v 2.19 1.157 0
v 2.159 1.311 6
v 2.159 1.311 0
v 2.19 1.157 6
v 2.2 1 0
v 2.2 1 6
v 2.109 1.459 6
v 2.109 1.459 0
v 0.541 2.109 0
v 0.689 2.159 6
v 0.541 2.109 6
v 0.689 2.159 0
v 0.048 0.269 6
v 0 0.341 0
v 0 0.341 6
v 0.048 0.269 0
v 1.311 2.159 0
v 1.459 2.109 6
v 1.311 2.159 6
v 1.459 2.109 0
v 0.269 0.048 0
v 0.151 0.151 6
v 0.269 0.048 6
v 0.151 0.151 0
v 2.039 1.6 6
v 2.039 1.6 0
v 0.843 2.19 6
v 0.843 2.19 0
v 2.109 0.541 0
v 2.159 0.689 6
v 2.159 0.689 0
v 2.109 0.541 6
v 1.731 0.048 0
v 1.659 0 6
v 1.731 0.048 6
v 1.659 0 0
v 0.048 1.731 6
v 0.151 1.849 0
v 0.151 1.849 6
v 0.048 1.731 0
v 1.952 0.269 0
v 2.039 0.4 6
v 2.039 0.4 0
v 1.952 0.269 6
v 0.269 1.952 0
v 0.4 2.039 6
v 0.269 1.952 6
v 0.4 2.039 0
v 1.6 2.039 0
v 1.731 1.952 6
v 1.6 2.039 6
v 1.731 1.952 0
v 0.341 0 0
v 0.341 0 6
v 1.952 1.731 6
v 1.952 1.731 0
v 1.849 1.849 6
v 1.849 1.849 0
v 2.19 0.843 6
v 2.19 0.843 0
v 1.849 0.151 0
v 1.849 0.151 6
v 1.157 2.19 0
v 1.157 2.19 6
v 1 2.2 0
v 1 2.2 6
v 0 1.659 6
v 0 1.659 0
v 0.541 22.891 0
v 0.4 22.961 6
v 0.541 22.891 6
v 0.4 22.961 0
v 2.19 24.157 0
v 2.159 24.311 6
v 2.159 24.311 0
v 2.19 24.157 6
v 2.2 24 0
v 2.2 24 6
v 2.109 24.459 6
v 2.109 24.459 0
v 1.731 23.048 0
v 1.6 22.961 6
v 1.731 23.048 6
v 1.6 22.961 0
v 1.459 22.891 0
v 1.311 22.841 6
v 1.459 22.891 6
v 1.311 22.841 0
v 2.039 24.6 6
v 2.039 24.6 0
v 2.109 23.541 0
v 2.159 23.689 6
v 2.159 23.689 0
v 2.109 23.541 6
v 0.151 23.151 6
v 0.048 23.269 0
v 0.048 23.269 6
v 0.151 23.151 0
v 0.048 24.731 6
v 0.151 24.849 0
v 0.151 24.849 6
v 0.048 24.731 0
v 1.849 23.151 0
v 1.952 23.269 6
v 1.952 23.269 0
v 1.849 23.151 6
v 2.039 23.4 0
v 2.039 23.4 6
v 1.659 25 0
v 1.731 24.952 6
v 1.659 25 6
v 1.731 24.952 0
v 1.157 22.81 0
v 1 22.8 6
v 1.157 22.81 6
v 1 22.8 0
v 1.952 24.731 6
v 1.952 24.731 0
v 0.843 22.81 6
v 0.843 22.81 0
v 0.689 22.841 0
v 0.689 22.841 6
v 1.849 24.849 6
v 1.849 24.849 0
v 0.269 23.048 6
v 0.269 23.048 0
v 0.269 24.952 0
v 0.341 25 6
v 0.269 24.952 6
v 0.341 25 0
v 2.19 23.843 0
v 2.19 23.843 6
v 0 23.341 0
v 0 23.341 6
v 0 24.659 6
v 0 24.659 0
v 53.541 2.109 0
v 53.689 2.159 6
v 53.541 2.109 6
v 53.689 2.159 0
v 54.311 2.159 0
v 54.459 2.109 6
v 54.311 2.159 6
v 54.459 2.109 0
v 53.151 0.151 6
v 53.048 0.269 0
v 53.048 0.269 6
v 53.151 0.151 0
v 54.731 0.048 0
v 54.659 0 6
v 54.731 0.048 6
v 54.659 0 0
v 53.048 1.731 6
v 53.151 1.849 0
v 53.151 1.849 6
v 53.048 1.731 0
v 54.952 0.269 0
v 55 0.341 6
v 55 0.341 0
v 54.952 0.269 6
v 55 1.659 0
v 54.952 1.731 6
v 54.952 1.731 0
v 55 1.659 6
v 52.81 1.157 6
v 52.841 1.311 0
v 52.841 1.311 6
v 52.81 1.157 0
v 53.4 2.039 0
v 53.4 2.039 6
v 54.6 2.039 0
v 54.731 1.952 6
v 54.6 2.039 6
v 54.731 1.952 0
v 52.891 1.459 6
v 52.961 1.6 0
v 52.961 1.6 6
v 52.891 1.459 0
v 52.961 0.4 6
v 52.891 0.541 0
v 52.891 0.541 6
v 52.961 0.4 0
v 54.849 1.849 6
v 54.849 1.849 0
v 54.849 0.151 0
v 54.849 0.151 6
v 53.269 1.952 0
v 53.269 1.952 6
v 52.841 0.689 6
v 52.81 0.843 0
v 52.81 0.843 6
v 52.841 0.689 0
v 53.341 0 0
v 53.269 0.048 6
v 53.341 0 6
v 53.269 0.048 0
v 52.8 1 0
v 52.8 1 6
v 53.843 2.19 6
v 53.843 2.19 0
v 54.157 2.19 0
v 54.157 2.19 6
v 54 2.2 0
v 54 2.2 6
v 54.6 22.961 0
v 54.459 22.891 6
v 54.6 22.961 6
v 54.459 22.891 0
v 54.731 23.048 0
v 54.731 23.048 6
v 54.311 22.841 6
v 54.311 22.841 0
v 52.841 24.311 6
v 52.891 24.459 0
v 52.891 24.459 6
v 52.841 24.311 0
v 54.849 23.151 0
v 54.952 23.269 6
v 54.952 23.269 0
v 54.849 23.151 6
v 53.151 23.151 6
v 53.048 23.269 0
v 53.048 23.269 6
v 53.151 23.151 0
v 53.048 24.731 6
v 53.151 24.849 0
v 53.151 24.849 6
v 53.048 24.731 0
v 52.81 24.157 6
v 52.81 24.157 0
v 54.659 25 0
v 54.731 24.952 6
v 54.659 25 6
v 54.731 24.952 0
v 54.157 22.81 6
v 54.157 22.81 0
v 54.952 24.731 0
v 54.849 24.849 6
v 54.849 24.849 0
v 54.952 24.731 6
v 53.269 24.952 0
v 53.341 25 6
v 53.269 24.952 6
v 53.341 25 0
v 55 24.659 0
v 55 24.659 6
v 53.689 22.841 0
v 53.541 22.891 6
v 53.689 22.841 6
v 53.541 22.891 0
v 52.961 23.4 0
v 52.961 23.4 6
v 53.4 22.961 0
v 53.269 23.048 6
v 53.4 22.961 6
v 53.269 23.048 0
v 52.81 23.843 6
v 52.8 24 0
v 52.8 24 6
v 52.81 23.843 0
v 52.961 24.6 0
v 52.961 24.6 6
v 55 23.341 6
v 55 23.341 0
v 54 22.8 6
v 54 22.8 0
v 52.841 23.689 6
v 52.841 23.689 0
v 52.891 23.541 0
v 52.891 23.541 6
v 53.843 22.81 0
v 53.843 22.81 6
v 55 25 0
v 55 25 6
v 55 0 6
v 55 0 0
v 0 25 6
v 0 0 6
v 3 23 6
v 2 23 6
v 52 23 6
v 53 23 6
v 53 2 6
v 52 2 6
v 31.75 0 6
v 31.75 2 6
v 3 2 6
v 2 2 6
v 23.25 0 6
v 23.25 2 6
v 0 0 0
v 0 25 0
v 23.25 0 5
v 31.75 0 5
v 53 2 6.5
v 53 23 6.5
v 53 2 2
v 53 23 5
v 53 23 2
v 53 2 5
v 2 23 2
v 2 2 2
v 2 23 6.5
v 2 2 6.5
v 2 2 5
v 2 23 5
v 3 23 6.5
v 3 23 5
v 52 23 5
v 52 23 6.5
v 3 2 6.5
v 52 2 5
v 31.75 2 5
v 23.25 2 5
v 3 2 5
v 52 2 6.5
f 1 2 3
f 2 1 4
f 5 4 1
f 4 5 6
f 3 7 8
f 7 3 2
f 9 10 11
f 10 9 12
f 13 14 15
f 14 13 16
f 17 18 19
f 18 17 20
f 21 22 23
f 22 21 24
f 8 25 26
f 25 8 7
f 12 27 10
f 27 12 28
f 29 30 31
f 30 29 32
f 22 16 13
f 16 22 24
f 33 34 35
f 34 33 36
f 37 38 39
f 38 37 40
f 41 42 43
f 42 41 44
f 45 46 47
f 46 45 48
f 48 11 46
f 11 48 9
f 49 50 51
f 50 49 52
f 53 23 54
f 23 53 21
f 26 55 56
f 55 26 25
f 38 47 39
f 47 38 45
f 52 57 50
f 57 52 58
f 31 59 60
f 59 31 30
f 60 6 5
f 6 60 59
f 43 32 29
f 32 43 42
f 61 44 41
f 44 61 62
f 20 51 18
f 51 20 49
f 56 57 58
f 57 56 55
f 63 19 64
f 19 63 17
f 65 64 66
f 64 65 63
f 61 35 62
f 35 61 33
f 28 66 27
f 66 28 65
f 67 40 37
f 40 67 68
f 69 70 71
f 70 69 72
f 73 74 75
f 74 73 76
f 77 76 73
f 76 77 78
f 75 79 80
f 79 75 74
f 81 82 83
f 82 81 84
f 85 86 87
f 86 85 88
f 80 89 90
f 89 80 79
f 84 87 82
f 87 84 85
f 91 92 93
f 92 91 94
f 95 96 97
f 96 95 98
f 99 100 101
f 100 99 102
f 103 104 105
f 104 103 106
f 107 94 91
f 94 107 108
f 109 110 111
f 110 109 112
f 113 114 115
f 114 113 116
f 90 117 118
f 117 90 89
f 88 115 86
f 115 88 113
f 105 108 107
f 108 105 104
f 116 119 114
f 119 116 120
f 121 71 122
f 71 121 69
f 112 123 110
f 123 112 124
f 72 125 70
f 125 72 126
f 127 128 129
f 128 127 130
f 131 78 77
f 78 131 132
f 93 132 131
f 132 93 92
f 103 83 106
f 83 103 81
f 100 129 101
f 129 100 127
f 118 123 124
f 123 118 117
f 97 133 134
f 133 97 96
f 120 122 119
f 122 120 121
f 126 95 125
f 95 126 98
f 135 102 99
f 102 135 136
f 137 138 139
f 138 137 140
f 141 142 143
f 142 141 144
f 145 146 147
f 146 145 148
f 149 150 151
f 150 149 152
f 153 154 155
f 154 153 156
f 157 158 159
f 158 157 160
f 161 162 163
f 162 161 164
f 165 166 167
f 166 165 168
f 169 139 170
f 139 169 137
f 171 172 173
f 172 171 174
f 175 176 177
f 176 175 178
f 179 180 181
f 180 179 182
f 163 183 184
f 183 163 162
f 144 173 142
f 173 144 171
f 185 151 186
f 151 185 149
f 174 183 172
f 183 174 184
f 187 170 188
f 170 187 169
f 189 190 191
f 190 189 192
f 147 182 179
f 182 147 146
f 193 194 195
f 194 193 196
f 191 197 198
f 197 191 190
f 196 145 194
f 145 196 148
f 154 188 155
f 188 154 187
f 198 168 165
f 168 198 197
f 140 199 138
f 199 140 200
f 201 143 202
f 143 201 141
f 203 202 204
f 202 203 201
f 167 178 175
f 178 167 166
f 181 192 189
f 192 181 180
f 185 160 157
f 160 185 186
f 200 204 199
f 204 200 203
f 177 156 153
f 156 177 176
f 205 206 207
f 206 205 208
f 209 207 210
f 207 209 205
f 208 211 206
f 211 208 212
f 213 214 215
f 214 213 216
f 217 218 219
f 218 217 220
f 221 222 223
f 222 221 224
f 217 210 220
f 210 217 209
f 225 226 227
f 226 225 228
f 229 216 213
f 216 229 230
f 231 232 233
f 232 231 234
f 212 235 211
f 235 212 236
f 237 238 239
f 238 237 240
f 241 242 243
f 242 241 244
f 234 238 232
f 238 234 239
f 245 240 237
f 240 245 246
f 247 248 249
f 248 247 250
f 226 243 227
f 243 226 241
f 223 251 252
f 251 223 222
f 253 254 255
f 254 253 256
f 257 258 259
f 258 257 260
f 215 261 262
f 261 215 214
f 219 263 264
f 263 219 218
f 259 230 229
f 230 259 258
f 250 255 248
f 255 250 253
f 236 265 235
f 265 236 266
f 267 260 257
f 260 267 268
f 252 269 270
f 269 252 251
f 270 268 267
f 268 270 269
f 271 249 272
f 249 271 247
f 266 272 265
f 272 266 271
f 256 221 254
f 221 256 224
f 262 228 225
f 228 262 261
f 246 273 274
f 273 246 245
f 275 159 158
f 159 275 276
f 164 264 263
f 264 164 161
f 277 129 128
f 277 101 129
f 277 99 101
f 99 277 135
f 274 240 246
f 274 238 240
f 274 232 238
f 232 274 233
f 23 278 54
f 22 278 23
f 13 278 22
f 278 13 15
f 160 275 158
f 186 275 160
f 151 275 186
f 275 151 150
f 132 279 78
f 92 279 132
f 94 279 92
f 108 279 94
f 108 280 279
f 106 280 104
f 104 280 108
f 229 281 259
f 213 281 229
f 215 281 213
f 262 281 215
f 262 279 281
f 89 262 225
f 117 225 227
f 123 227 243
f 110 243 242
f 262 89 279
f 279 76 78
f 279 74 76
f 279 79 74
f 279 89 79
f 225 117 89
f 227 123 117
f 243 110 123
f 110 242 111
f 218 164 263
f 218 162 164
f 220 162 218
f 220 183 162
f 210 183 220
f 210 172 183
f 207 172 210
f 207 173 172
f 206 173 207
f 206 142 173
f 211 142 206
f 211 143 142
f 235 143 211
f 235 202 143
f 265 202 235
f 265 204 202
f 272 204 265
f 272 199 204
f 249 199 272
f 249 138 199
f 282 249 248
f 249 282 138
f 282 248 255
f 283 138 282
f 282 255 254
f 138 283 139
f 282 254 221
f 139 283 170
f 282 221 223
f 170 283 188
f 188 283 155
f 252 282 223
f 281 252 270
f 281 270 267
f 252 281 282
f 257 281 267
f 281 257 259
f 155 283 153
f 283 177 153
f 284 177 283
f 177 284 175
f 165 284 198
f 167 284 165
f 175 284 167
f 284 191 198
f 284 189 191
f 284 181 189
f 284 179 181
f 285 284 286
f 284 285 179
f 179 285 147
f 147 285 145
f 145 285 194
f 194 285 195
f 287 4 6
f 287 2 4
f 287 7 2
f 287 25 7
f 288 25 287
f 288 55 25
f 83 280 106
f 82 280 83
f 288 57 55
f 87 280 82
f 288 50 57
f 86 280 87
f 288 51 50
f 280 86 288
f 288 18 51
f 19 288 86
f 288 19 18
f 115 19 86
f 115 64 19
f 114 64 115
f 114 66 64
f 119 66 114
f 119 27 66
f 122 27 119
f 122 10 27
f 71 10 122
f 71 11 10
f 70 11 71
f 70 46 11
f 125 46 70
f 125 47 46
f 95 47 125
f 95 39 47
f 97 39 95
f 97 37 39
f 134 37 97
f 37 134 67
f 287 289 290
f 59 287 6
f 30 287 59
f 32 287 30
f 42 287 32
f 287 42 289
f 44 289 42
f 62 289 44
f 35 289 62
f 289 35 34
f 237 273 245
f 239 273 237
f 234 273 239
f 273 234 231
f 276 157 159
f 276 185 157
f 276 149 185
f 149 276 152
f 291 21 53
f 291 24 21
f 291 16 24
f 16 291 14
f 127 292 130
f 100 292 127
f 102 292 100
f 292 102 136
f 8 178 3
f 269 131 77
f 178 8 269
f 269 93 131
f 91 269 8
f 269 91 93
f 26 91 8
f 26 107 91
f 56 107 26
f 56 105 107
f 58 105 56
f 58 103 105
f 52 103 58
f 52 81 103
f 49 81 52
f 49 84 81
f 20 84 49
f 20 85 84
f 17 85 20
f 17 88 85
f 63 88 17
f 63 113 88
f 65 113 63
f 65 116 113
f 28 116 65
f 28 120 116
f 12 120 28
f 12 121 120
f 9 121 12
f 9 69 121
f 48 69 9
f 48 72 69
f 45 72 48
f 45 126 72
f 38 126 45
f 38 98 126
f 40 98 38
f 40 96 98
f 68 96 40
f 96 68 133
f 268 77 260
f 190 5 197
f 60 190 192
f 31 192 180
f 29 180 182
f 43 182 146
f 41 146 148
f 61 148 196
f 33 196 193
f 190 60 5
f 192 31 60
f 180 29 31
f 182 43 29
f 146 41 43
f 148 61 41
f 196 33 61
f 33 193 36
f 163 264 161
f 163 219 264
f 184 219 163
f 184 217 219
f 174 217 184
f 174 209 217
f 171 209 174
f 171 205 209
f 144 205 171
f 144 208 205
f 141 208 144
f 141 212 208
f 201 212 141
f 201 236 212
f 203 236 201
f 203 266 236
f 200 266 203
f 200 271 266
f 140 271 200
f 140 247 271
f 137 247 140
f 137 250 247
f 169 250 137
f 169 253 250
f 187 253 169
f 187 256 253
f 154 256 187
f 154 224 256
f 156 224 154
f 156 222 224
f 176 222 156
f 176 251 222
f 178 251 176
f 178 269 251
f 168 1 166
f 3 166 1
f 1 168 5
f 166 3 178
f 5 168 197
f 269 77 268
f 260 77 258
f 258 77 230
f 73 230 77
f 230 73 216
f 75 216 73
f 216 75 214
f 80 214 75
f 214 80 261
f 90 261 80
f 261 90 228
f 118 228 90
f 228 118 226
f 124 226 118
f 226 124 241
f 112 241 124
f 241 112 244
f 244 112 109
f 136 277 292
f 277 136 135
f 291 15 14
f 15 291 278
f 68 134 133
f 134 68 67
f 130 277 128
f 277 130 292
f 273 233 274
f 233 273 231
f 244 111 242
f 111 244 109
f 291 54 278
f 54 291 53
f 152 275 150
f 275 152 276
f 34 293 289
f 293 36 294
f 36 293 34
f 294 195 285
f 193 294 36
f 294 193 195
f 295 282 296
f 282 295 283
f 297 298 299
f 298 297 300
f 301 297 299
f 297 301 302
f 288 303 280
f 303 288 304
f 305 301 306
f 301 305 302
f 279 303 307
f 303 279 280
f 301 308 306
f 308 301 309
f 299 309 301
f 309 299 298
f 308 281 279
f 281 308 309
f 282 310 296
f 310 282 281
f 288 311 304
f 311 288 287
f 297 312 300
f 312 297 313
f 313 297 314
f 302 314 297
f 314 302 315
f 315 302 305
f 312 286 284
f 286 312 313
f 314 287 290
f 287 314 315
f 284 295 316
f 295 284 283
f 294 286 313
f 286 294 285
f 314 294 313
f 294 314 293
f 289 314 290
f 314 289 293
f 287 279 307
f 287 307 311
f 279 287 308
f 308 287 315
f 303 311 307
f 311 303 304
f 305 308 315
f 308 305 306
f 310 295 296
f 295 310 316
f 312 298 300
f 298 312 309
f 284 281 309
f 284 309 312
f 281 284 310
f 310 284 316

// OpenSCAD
// file: params.scad
/*
 * params.scad — every dimension the printed parts share, in millimetres.
 * ======================================================================
 * Included by all cad/*.scad files. No dimension may be duplicated in a part
 * file; if two parts need the same number, it lives here.
 *
 * Values marked MEASURE are design targets until caliper measurements of a real
 * X240 top section replace them (issue #44). Everything else is a design choice.
 */

// ---------------------------------------------------------------- deck / case
case_width  = 309.0;   // MEASURE  X, left to right, at the deck's mating surface
case_depth  = 210.0;   // MEASURE  Y, front (palmrest) to back
wall_t      = 2.5;     // PETG shell wall
corner_r    = 3.0;     // MEASURE  outer corner radius
internal_h  = 18.0;    // floor-to-deck clearance (see docs/enclosure/integration.md)
case_h      = internal_h + wall_t;

// Screw bosses that meet the X240 deck, from the front-left corner.  MEASURE all.
deck_boss_positions = [
    [  8.0,   8.0 ], [ 60.0,   8.0 ], [150.0,   8.0 ], [250.0,   8.0 ], [301.0,   8.0 ],
    [  8.0, 202.0 ], [150.0, 202.0 ], [301.0, 202.0 ],
];
boss_od = 6.0;
boss_id = 3.2;         // M2 heat-set insert hole (insert OD ~3.2 for a 3.5 mm body)

// ---------------------------------------------------------------- split joint
split      = true;     // print as two halves (fits a 220 mm bed); false = one piece
split_x    = case_width / 2;
tab_count  = 3;        // dovetail tabs along the floor seam
tab_w      = 14.0;     // tab width at the seam
tab_flare  = 3.0;      // extra width at the tip (dovetail angle)
tab_len    = 10.0;     // how far the tab reaches into the other half
joint_gap  = 0.15;     // clearance per face; tune with a 30 mm coupon
pin_d      = 3.0;      // alignment pins through the front/rear walls
pin_len    = 10.0;

// ---------------------------------------------------------------- board / sled
board_w    = 100.0;    // stripboard or Rev B PCB
board_d    = 80.0;
board_hole_inset = 4.0;                  // M2 holes this far from each board corner
board_hole_d     = 2.4;
sled_margin      = 6.0;                  // sled extends this far past the board
sled_t           = 2.0;
sled_standoff_h  = 6.0;                  // board sits this high above the sled
sled_standoff_od = 5.0;
// sled centre in the case (rear-centre; see docs/enclosure/integration.md)
sled_center = [ case_width / 2, case_depth - 8 - board_d / 2 - sled_margin - 6 ];
// sled-to-case bosses (around the sled, two per half so the sled bridges the seam)
sled_boss_offsets = [ [-56, -46], [56, -46], [-56, 46], [56, 46] ];

// ---------------------------------------------------------------- Pico
pico_w = 51.0;
pico_d = 21.0;
pico_h = 1.0;          // PCB thickness
pico_hole_d = 2.1;     // Pico mounting holes, 11.4 x 47 mm pattern
pico_hole_dx = 47.0;
pico_hole_dy = 11.4;

// ---------------------------------------------------------------- USB
usb_c     = false;                     // false = Micro-USB cutout, true = USB-C
usb_w     = usb_c ? 9.5 : 8.5;
usb_h     = usb_c ? 4.0 : 3.5;
usb_x     = sled_center[0];            // cutout centred on the board
usb_z     = wall_t + sled_t + sled_standoff_h + 1.6;   // bottom of the Pico's connector
cable_d   = 4.5;                       // USB cable jacket diameter
relief_w  = 22.0;                      // strain-relief bezel footprint
relief_d  = 12.0;
relief_h  = 10.0;

// ---------------------------------------------------------------- FPC
fpc_w        = 22.0;   // 40-pin 0.5 mm cable width
fpc_t        = 0.3;
fpc_min_r    = 5.0;    // minimum bend radius
clickpad_fpc_w = 8.0;  // MEASURE  ClickPad cable width
zif_body_w   = 26.0;   // 40-pin ZIF connector body length along the cable edge
zif_body_d   = 6.0;
zif_body_h   = 5.0;
zif_cp_body_w = 12.0;  // ClickPad ZIF body (pin count from probing)

// ---------------------------------------------------------------- gasket, vents, feet
gasket_depth = 1.2;
gasket_width = 2.0;
vents        = false;  // not thermally needed (docs/enclosure/durability.md)
vent_w = 40.0; vent_h = 2.0; vent_count = 4; vent_spacing = 6.0;
ribs         = true;   // two front-to-back stiffening ribs in the floor
rib_t        = 2.0;
rib_h        = 4.0;

foot_d       = 10.0;   // rubber feet, front
foot_recess  = 1.0;
foot_positions = [ [25, 20], [case_width - 25, 20] ];
tilt_positions = [ [25, case_depth - 20], [case_width - 25, case_depth - 20] ];
tilt_h       = 12.0;   // rear riser height
tilt_w       = 30.0;
tilt_d       = 20.0;
tilt_screw_d = 3.4;    // M3 clearance

// ---------------------------------------------------------------- LED light pipe
pipe_d       = 3.0;
pipe_flange_d= 5.0;
pipe_len     = internal_h - 2;
pipe_position = [ sled_center[0] + board_w / 2 + 15, sled_center[1] - 20 ];  // beside the touchpad

// ---------------------------------------------------------------- printing
fit      = 0.2;        // general hole clearance for printed-in-place fits
$fn      = 48;
// main file
/*
 * pico_mount_bracket.scad — Raspberry Pi Pico cradle (Rev A only)
 * ===============================================================
 * Holds a socketed Pico at a fixed height on the perfboard sled; the Rev B PCB
 * carries the Pico directly and does not need this.  Dimensions from params.scad.
 */
include <params.scad>

floor_clear = 2.0;     // under the PCB for solder joints
bracket_wall = 2.0;
lip_h = 1.5;
lip_inset = 1.0;
bracket_h = bracket_wall + floor_clear + pico_h + 1.0;

module pico_bracket() {
    difference() {
        cube([pico_w + 2 * bracket_wall, pico_d + 2 * bracket_wall, bracket_h]);
        translate([bracket_wall, bracket_wall, bracket_wall]) cube([pico_w, pico_d, bracket_h]);
        for (x = [bracket_wall / 2, pico_w + bracket_wall * 1.5], y = [bracket_wall / 2, pico_d + bracket_wall * 1.5])
            translate([x, y, -1]) cylinder(h = bracket_h + 2, d = 2.4);
        // USB opening in the front wall
        translate([pico_w / 2 + bracket_wall - usb_w / 2, -1, bracket_wall + floor_clear + 1]) cube([usb_w, bracket_wall + 2, 4]);
    }
    translate([bracket_wall, bracket_wall, bracket_wall + floor_clear + pico_h]) cube([lip_inset, pico_d, lip_h]);
    translate([bracket_wall + pico_w - lip_inset, bracket_wall, bracket_wall + floor_clear + pico_h]) cube([lip_inset, pico_d, lip_h]);
}

pico_bracket();
